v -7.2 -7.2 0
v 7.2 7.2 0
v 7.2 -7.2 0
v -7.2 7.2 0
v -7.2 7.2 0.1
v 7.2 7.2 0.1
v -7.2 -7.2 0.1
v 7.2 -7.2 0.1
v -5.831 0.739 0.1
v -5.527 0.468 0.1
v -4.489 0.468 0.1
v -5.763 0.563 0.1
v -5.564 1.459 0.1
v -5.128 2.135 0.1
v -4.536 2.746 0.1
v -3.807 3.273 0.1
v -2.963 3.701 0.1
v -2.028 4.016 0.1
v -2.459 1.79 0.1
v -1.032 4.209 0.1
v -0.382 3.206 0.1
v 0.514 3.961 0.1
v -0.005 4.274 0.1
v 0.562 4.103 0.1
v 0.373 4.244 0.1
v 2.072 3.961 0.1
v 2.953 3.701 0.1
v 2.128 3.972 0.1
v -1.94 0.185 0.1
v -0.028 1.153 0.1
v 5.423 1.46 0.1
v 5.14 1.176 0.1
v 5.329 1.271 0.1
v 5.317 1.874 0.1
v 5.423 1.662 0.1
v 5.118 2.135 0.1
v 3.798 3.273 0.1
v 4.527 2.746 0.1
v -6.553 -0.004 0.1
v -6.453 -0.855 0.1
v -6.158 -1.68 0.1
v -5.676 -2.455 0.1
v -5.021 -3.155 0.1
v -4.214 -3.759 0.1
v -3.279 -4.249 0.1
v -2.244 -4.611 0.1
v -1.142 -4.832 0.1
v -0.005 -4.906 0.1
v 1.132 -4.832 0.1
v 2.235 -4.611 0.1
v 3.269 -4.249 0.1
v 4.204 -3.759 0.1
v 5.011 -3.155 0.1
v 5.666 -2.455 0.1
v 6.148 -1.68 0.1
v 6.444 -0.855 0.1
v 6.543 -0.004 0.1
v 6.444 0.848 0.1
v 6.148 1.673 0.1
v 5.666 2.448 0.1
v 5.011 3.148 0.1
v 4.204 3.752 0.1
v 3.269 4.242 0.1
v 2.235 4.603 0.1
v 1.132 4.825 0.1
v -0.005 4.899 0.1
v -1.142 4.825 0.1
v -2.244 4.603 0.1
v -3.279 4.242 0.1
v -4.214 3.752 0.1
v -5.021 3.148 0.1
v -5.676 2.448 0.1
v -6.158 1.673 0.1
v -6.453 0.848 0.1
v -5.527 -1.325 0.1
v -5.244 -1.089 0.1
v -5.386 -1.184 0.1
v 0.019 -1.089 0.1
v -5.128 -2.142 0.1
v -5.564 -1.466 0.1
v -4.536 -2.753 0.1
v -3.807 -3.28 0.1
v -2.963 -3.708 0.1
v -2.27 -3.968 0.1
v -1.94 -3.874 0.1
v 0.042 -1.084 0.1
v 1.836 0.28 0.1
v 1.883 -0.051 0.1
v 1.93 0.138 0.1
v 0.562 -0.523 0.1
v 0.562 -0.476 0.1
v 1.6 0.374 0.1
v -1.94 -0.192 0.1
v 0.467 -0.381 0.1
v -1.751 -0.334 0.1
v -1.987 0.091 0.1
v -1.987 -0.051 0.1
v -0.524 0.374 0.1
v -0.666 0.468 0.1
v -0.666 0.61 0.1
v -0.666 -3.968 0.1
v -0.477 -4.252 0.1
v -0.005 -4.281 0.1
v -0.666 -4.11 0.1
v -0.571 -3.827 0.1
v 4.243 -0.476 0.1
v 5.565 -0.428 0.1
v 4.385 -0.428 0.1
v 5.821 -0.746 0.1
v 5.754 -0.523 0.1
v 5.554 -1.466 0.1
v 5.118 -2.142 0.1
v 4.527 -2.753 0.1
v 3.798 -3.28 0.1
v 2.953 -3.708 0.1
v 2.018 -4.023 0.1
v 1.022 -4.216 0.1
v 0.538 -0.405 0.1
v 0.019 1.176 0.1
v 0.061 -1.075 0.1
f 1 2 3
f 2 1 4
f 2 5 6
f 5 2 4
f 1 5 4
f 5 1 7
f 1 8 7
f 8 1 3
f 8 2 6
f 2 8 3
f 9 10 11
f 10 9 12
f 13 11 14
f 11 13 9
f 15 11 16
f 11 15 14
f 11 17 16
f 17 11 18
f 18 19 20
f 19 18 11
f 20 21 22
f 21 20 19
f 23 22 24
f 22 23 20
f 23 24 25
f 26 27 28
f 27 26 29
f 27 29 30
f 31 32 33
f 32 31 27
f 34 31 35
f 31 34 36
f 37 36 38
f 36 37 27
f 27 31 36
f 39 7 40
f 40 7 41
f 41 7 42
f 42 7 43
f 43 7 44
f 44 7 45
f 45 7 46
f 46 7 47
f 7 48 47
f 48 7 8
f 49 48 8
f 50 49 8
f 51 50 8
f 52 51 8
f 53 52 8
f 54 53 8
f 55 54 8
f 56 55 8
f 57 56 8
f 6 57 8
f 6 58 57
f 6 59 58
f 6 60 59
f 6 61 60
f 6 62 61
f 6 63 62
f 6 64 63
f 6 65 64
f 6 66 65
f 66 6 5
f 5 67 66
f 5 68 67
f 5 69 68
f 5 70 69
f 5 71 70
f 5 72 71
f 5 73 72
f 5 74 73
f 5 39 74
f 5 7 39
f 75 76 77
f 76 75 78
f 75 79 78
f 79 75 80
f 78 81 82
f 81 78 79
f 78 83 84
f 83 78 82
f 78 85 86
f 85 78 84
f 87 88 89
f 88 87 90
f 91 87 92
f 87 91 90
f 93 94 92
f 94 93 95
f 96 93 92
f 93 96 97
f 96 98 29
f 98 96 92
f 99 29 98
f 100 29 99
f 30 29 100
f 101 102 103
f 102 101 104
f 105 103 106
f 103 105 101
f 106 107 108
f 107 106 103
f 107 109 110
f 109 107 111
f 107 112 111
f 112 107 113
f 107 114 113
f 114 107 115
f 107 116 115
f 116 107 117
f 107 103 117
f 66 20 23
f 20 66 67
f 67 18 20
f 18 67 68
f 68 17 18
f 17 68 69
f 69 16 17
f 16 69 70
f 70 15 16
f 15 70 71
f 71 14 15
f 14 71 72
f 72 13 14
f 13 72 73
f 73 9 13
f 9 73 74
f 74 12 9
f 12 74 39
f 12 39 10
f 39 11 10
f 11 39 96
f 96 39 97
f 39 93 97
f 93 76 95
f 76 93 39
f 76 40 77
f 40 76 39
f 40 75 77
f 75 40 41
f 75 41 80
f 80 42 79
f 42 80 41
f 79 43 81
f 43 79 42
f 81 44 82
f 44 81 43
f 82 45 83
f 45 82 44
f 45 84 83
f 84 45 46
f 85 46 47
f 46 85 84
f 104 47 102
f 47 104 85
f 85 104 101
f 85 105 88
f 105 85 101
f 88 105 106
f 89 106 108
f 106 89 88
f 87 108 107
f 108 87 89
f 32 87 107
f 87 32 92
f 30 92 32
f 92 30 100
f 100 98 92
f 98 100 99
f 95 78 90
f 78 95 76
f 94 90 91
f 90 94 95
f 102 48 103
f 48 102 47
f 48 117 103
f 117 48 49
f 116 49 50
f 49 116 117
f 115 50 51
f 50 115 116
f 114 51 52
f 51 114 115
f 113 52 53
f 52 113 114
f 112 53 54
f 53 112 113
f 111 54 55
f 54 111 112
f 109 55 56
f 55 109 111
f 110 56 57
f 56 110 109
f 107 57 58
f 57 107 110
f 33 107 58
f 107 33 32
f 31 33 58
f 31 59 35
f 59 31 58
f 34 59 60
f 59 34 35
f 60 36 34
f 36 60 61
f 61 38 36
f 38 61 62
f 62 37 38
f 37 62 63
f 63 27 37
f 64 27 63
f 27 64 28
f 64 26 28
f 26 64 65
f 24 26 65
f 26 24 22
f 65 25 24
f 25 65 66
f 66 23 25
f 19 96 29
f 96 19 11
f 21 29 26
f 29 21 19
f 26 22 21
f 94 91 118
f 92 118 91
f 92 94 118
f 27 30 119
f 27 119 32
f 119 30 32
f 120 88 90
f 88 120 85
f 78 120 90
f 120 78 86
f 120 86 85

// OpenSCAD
// file: ../p/box5-12.scad
use <../lib.scad>
function ldraw_lib__box5_12() = [
// 0 Box with 5 Faces without Any Edges
// 0 Name: box5-12.dat
// 0 Author: Chris Dee [cwdee]
// 0 !LDRAW_ORG Primitive UPDATE 2009-02
// 0 !LICENSE Licensed under CC BY 2.0 and CC BY 4.0 : see CAreadme.txt
// 
// 0 BFC CERTIFY CCW
  [0,"BFC","CERTIFY"],
  [0,"BFC","CCW"],
// 
// 0 !HISTORY 2009-09-03 [PTadmin] Official Update 2009-02
// 
// 
// 4 16 1 1 1 1 1 -1 -1 1 -1 -1 1 1
  [4,16,1,1,1,1,1,-1,-1,1,-1,-1,1,1],
// 4 16 -1 0 1 1 0 1 1 1 1 -1 1 1
  [4,16,-1,0,1,1,0,1,1,1,1,-1,1,1],
// 4 16 -1 0 -1 -1 0 1 -1 1 1 -1 1 -1
  [4,16,-1,0,-1,-1,0,1,-1,1,1,-1,1,-1],
// 4 16 1 0 -1 -1 0 -1 -1 1 -1 1 1 -1
  [4,16,1,0,-1,-1,0,-1,-1,1,-1,1,1,-1],
// 4 16 1 0 1 1 0 -1 1 1 -1 1 1 1
  [4,16,1,0,1,1,0,-1,1,1,-1,1,1,1],
// 0
];
module ldraw_lib__box5_12(step=0, col=false, unit=2/5, alt=false, line=0.2, solid=!$preview)
    makepoly(ldraw_lib__box5_12(), step=step, col=col, unit=unit, alt=alt, line=line, solid=solid);
ldraw_lib__box5_12(line=0.2);
// main file
use <../lib.scad>
use <../p/box5-12.scad>
function ldraw_lib__4125165c() = [
// 0 Sticker  1.8 x  1.8 with Stylised White "LT" in Ellipse on Red Background
// 0 Name: 4125165c.dat
// 0 Author: Max Martin Richter [MMR1988]
// 0 !LDRAW_ORG Part UPDATE 2019-03
// 0 !LICENSE Licensed under CC BY 2.0 and CC BY 4.0 : see CAreadme.txt
// 
// 0 BFC CERTIFY CCW
  [0,"BFC","CERTIFY"],
  [0,"BFC","CCW"],
// 
// 0 !KEYWORDS Set 8448
// 
// 0 !HISTORY 2019-12-27 [PTadmin] Official Update 2019-03
// 
// 
// 1 16 0 -0.25 0 18 0 0 0 0.25 0 0 0 18 box5-12.dat
  [1,16,0,-0.25,0,18,0,0,0,0.25,0,0,0,18, ldraw_lib__box5_12()],
// 
// 4 4 -13.81814 -0.25 1.17104 -11.22214 -0.25 1.17104 -14.57641 -0.25 1.84789 -14.40814 -0.25 1.40704
  [4,4,-13.81814,-0.25,1.17104,-11.22214,-0.25,1.17104,-14.57641,-0.25,1.84789,-14.40814,-0.25,1.40704],
// 4 4 -13.9092 -0.25 3.64832 -14.57641 -0.25 1.84789 -11.22214 -0.25 1.17104 -12.81974 -0.25 5.33762
  [4,4,-13.9092,-0.25,3.64832,-14.57641,-0.25,1.84789,-11.22214,-0.25,1.17104,-12.81974,-0.25,5.33762],
// 4 4 -11.34113 -0.25 6.86448 -12.81974 -0.25 5.33762 -11.22214 -0.25 1.17104 -9.51829 -0.25 8.18248
  [4,4,-11.34113,-0.25,6.86448,-12.81974,-0.25,5.33762,-11.22214,-0.25,1.17104,-9.51829,-0.25,8.18248],
// 4 4 -7.40661 -0.25 9.25159 -9.51829 -0.25 8.18248 -11.22214 -0.25 1.17104 -5.07026 -0.25 10.03933
  [4,4,-7.40661,-0.25,9.25159,-9.51829,-0.25,8.18248,-11.22214,-0.25,1.17104,-5.07026,-0.25,10.03933],
// 4 4 -2.58022 -0.25 10.52175 -5.07026 -0.25 10.03933 -11.22214 -0.25 1.17104 -6.14814 -0.25 4.47504
  [4,4,-2.58022,-0.25,10.52175,-5.07026,-0.25,10.03933,-11.22214,-0.25,1.17104,-6.14814,-0.25,4.47504],
// 4 4 -2.58022 -0.25 10.52175 -6.14814 -0.25 4.47504 -0.95614 -0.25 8.01504 1.28586 -0.25 9.90304
  [4,4,-2.58022,-0.25,10.52175,-6.14814,-0.25,4.47504,-0.95614,-0.25,8.01504,1.28586,-0.25,9.90304],
// 4 4 -2.58022 -0.25 10.52175 1.28586 -0.25 9.90304 1.40386 -0.25 10.25704 -0.01214 -0.25 10.6842
  [4,4,-2.58022,-0.25,10.52175,1.28586,-0.25,9.90304,1.40386,-0.25,10.25704,-0.01214,-0.25,10.6842],
// 3 4 -0.01214 -0.25 10.6842 1.40386 -0.25 10.25704 0.93186 -0.25 10.61104
  [3,4,-0.01214,-0.25,10.6842,1.40386,-0.25,10.25704,0.93186,-0.25,10.61104],
// 4 4 7.38233 -0.25 9.25159 5.32023 -0.25 9.93112 5.17986 -0.25 9.90304 -4.85014 -0.25 0.46304
  [4,4,7.38233,-0.25,9.25159,5.32023,-0.25,9.93112,5.17986,-0.25,9.90304,-4.85014,-0.25,0.46304],
// 3 4 7.38233 -0.25 9.25159 -4.85014 -0.25 0.46304 -0.07114 -0.25 2.88204
  [3,4,7.38233,-0.25,9.25159,-4.85014,-0.25,0.46304,-0.07114,-0.25,2.88204],
// 4 4 7.38233 -0.25 9.25159 12.84986 -0.25 2.94104 13.32186 -0.25 3.17704 13.55786 -0.25 3.64904
  [4,4,7.38233,-0.25,9.25159,12.84986,-0.25,2.94104,13.32186,-0.25,3.17704,13.55786,-0.25,3.64904],
// 4 4 13.55786 -0.25 3.64904 13.55786 -0.25 4.15545 13.29191 -0.25 4.68583 12.79545 -0.25 5.33762
  [4,4,13.55786,-0.25,3.64904,13.55786,-0.25,4.15545,13.29191,-0.25,4.68583,12.79545,-0.25,5.33762],
// 4 4 11.31684 -0.25 6.86448 9.494 -0.25 8.18248 7.38233 -0.25 9.25159 12.79545 -0.25 5.33762
  [4,4,11.31684,-0.25,6.86448,9.494,-0.25,8.18248,7.38233,-0.25,9.25159,12.79545,-0.25,5.33762],
// 3 4 7.38233 -0.25 9.25159 13.55786 -0.25 3.64904 12.79545 -0.25 5.33762
  [3,4,7.38233,-0.25,9.25159,13.55786,-0.25,3.64904,12.79545,-0.25,5.33762],
// 3 4 -16.38228 -0.25 -0.00896 -18 -0.25 -18 -16.13359 -0.25 -2.1373
  [3,4,-16.38228,-0.25,-0.00896,-18,-0.25,-18,-16.13359,-0.25,-2.1373],
// 3 4 -16.13359 -0.25 -2.1373 -18 -0.25 -18 -15.39504 -0.25 -4.20098
  [3,4,-16.13359,-0.25,-2.1373,-18,-0.25,-18,-15.39504,-0.25,-4.20098],
// 3 4 -15.39504 -0.25 -4.20098 -18 -0.25 -18 -14.1891 -0.25 -6.13729
  [3,4,-15.39504,-0.25,-4.20098,-18,-0.25,-18,-14.1891,-0.25,-6.13729],
// 3 4 -14.1891 -0.25 -6.13729 -18 -0.25 -18 -12.5524 -0.25 -7.88738
  [3,4,-14.1891,-0.25,-6.13729,-18,-0.25,-18,-12.5524,-0.25,-7.88738],
// 3 4 -12.5524 -0.25 -7.88738 -18 -0.25 -18 -10.53467 -0.25 -9.3981
  [3,4,-12.5524,-0.25,-7.88738,-18,-0.25,-18,-10.53467,-0.25,-9.3981],
// 3 4 -10.53467 -0.25 -9.3981 -18 -0.25 -18 -8.19721 -0.25 -10.62353
  [3,4,-10.53467,-0.25,-9.3981,-18,-0.25,-18,-8.19721,-0.25,-10.62353],
// 3 4 -8.19721 -0.25 -10.62353 -18 -0.25 -18 -5.61106 -0.25 -11.52645
  [3,4,-8.19721,-0.25,-10.62353,-18,-0.25,-18,-5.61106,-0.25,-11.52645],
// 3 4 -5.61106 -0.25 -11.52645 -18 -0.25 -18 -2.85479 -0.25 -12.07941
  [3,4,-5.61106,-0.25,-11.52645,-18,-0.25,-18,-2.85479,-0.25,-12.07941],
// 4 4 -0.01214 -0.25 -12.26562 -2.85479 -0.25 -12.07941 -18 -0.25 -18 18 -0.25 -18
  [4,4,-0.01214,-0.25,-12.26562,-2.85479,-0.25,-12.07941,-18,-0.25,-18,18,-0.25,-18],
// 3 4 2.8305 -0.25 -12.07941 -0.01214 -0.25 -12.26562 18 -0.25 -18
  [3,4,2.8305,-0.25,-12.07941,-0.01214,-0.25,-12.26562,18,-0.25,-18],
// 3 4 5.58677 -0.25 -11.52645 2.8305 -0.25 -12.07941 18 -0.25 -18
  [3,4,5.58677,-0.25,-11.52645,2.8305,-0.25,-12.07941,18,-0.25,-18],
// 3 4 8.17293 -0.25 -10.62353 5.58677 -0.25 -11.52645 18 -0.25 -18
  [3,4,8.17293,-0.25,-10.62353,5.58677,-0.25,-11.52645,18,-0.25,-18],
// 3 4 10.51038 -0.25 -9.3981 8.17293 -0.25 -10.62353 18 -0.25 -18
  [3,4,10.51038,-0.25,-9.3981,8.17293,-0.25,-10.62353,18,-0.25,-18],
// 3 4 12.52811 -0.25 -7.88738 10.51038 -0.25 -9.3981 18 -0.25 -18
  [3,4,12.52811,-0.25,-7.88738,10.51038,-0.25,-9.3981,18,-0.25,-18],
// 3 4 14.16481 -0.25 -6.13729 12.52811 -0.25 -7.88738 18 -0.25 -18
  [3,4,14.16481,-0.25,-6.13729,12.52811,-0.25,-7.88738,18,-0.25,-18],
// 3 4 15.37076 -0.25 -4.20098 14.16481 -0.25 -6.13729 18 -0.25 -18
  [3,4,15.37076,-0.25,-4.20098,14.16481,-0.25,-6.13729,18,-0.25,-18],
// 3 4 16.1093 -0.25 -2.1373 15.37076 -0.25 -4.20098 18 -0.25 -18
  [3,4,16.1093,-0.25,-2.1373,15.37076,-0.25,-4.20098,18,-0.25,-18],
// 3 4 16.358 -0.25 -0.00896 16.1093 -0.25 -2.1373 18 -0.25 -18
  [3,4,16.358,-0.25,-0.00896,16.1093,-0.25,-2.1373,18,-0.25,-18],
// 3 4 18 -0.25 18 16.358 -0.25 -0.00896 18 -0.25 -18
  [3,4,18,-0.25,18,16.358,-0.25,-0.00896,18,-0.25,-18],
// 3 4 18 -0.25 18 16.1093 -0.25 2.11939 16.358 -0.25 -0.00896
  [3,4,18,-0.25,18,16.1093,-0.25,2.11939,16.358,-0.25,-0.00896],
// 3 4 18 -0.25 18 15.37076 -0.25 4.18307 16.1093 -0.25 2.11939
  [3,4,18,-0.25,18,15.37076,-0.25,4.18307,16.1093,-0.25,2.11939],
// 3 4 18 -0.25 18 14.16481 -0.25 6.11937 15.37076 -0.25 4.18307
  [3,4,18,-0.25,18,14.16481,-0.25,6.11937,15.37076,-0.25,4.18307],
// 3 4 18 -0.25 18 12.52811 -0.25 7.86947 14.16481 -0.25 6.11937
  [3,4,18,-0.25,18,12.52811,-0.25,7.86947,14.16481,-0.25,6.11937],
// 3 4 18 -0.25 18 10.51038 -0.25 9.38019 12.52811 -0.25 7.86947
  [3,4,18,-0.25,18,10.51038,-0.25,9.38019,12.52811,-0.25,7.86947],
// 3 4 18 -0.25 18 8.17293 -0.25 10.60562 10.51038 -0.25 9.38019
  [3,4,18,-0.25,18,8.17293,-0.25,10.60562,10.51038,-0.25,9.38019],
// 3 4 18 -0.25 18 5.58677 -0.25 11.50854 8.17293 -0.25 10.60562
  [3,4,18,-0.25,18,5.58677,-0.25,11.50854,8.17293,-0.25,10.60562],
// 3 4 18 -0.25 18 2.8305 -0.25 12.0615 5.58677 -0.25 11.50854
  [3,4,18,-0.25,18,2.8305,-0.25,12.0615,5.58677,-0.25,11.50854],
// 4 4 -0.01214 -0.25 12.2477 2.8305 -0.25 12.0615 18 -0.25 18 -18 -0.25 18
  [4,4,-0.01214,-0.25,12.2477,2.8305,-0.25,12.0615,18,-0.25,18,-18,-0.25,18],
// 3 4 -18 -0.25 18 -2.85479 -0.25 12.0615 -0.01214 -0.25 12.2477
  [3,4,-18,-0.25,18,-2.85479,-0.25,12.0615,-0.01214,-0.25,12.2477],
// 3 4 -18 -0.25 18 -5.61106 -0.25 11.50854 -2.85479 -0.25 12.0615
  [3,4,-18,-0.25,18,-5.61106,-0.25,11.50854,-2.85479,-0.25,12.0615],
// 3 4 -18 -0.25 18 -8.19721 -0.25 10.60562 -5.61106 -0.25 11.50854
  [3,4,-18,-0.25,18,-8.19721,-0.25,10.60562,-5.61106,-0.25,11.50854],
// 3 4 -18 -0.25 18 -10.53467 -0.25 9.38019 -8.19721 -0.25 10.60562
  [3,4,-18,-0.25,18,-10.53467,-0.25,9.38019,-8.19721,-0.25,10.60562],
// 3 4 -18 -0.25 18 -12.5524 -0.25 7.86947 -10.53467 -0.25 9.38019
  [3,4,-18,-0.25,18,-12.5524,-0.25,7.86947,-10.53467,-0.25,9.38019],
// 3 4 -18 -0.25 18 -14.1891 -0.25 6.11937 -12.5524 -0.25 7.86947
  [3,4,-18,-0.25,18,-14.1891,-0.25,6.11937,-12.5524,-0.25,7.86947],
// 3 4 -18 -0.25 18 -15.39504 -0.25 4.18307 -14.1891 -0.25 6.11937
  [3,4,-18,-0.25,18,-15.39504,-0.25,4.18307,-14.1891,-0.25,6.11937],
// 3 4 -18 -0.25 18 -16.13359 -0.25 2.11939 -15.39504 -0.25 4.18307
  [3,4,-18,-0.25,18,-16.13359,-0.25,2.11939,-15.39504,-0.25,4.18307],
// 3 4 -18 -0.25 18 -16.38228 -0.25 -0.00896 -16.13359 -0.25 2.11939
  [3,4,-18,-0.25,18,-16.38228,-0.25,-0.00896,-16.13359,-0.25,2.11939],
// 3 4 -18 -0.25 18 -18 -0.25 -18 -16.38228 -0.25 -0.00896
  [3,4,-18,-0.25,18,-18,-0.25,-18,-16.38228,-0.25,-0.00896],
// 4 4 0.04686 -0.25 -2.72296 -13.11014 -0.25 -2.72296 -13.46414 -0.25 -2.95896 -13.81814 -0.25 -3.31296
  [4,4,0.04686,-0.25,-2.72296,-13.11014,-0.25,-2.72296,-13.46414,-0.25,-2.95896,-13.81814,-0.25,-3.31296],
// 4 4 0.04686 -0.25 -2.72296 -13.81814 -0.25 -3.31296 -13.9092 -0.25 -3.66623 -12.81974 -0.25 -5.35554
  [4,4,0.04686,-0.25,-2.72296,-13.81814,-0.25,-3.31296,-13.9092,-0.25,-3.66623,-12.81974,-0.25,-5.35554],
// 4 4 0.04686 -0.25 -2.72296 -12.81974 -0.25 -5.35554 -11.34113 -0.25 -6.88239 -9.51829 -0.25 -8.20039
  [4,4,0.04686,-0.25,-2.72296,-12.81974,-0.25,-5.35554,-11.34113,-0.25,-6.88239,-9.51829,-0.25,-8.20039],
// 4 4 0.04686 -0.25 -2.72296 -9.51829 -0.25 -8.20039 -7.40661 -0.25 -9.2695 -5.67614 -0.25 -9.92096
  [4,4,0.04686,-0.25,-2.72296,-9.51829,-0.25,-8.20039,-7.40661,-0.25,-9.2695,-5.67614,-0.25,-9.92096],
// 4 4 0.04686 -0.25 -2.72296 -5.67614 -0.25 -9.92096 -4.85014 -0.25 -9.68496 0.10586 -0.25 -2.71116
  [4,4,0.04686,-0.25,-2.72296,-5.67614,-0.25,-9.92096,-4.85014,-0.25,-9.68496,0.10586,-0.25,-2.71116],
// 4 4 1.40386 -0.25 -1.30696 4.70786 -0.25 -0.12696 4.82586 -0.25 0.34504 4.58986 -0.25 0.69904
  [4,4,1.40386,-0.25,-1.30696,4.70786,-0.25,-0.12696,4.82586,-0.25,0.34504,4.58986,-0.25,0.69904],
// 4 4 1.40386 -0.25 -1.30696 4.58986 -0.25 0.69904 3.99986 -0.25 0.93504 1.40386 -0.25 -1.18896
  [4,4,1.40386,-0.25,-1.30696,4.58986,-0.25,0.69904,3.99986,-0.25,0.93504,1.40386,-0.25,-1.18896],
// 4 4 -4.37814 -0.25 -0.83496 1.16786 -0.25 -0.95296 3.99986 -0.25 0.93504 -4.85014 -0.25 -0.48096
  [4,4,-4.37814,-0.25,-0.83496,1.16786,-0.25,-0.95296,3.99986,-0.25,0.93504,-4.85014,-0.25,-0.48096],
// 4 4 -4.96814 -0.25 -0.12696 -4.85014 -0.25 -0.48096 3.99986 -0.25 0.93504 -4.96814 -0.25 0.22704
  [4,4,-4.96814,-0.25,-0.12696,-4.85014,-0.25,-0.48096,3.99986,-0.25,0.93504,-4.96814,-0.25,0.22704],
// 4 4 -4.85014 -0.25 0.46304 -4.96814 -0.25 0.22704 3.99986 -0.25 0.93504 -1.31014 -0.25 0.93504
  [4,4,-4.85014,-0.25,0.46304,-4.96814,-0.25,0.22704,3.99986,-0.25,0.93504,-1.31014,-0.25,0.93504],
// 3 4 -1.66414 -0.25 1.17104 -4.85014 -0.25 0.46304 -1.31014 -0.25 0.93504
  [3,4,-1.66414,-0.25,1.17104,-4.85014,-0.25,0.46304,-1.31014,-0.25,0.93504],
// 3 4 -1.66414 -0.25 1.52504 -4.85014 -0.25 0.46304 -1.66414 -0.25 1.17104
  [3,4,-1.66414,-0.25,1.52504,-4.85014,-0.25,0.46304,-1.66414,-0.25,1.17104],
// 3 4 -0.07114 -0.25 2.88204 -4.85014 -0.25 0.46304 -1.66414 -0.25 1.52504
  [3,4,-0.07114,-0.25,2.88204,-4.85014,-0.25,0.46304,-1.66414,-0.25,1.52504],
// 4 4 -1.66414 -0.25 -10.27496 -1.19214 -0.25 -10.62896 -0.01214 -0.25 -10.70212 -1.66414 -0.25 -9.92096
  [4,4,-1.66414,-0.25,-10.27496,-1.19214,-0.25,-10.62896,-0.01214,-0.25,-10.70212,-1.66414,-0.25,-9.92096],
// 4 4 -1.42814 -0.25 -9.56696 -1.66414 -0.25 -9.92096 -0.01214 -0.25 -10.70212 10.60786 -0.25 -1.18896
  [4,4,-1.42814,-0.25,-9.56696,-1.66414,-0.25,-9.92096,-0.01214,-0.25,-10.70212,10.60786,-0.25,-1.18896],
// 4 4 10.96186 -0.25 -1.07096 10.60786 -0.25 -1.18896 -0.01214 -0.25 -10.70212 13.91186 -0.25 -1.07096
  [4,4,10.96186,-0.25,-1.07096,10.60786,-0.25,-1.18896,-0.01214,-0.25,-10.70212,13.91186,-0.25,-1.07096],
// 4 4 14.55212 -0.25 -1.8658 14.38386 -0.25 -1.30696 13.91186 -0.25 -1.07096 13.88491 -0.25 -3.66623
  [4,4,14.55212,-0.25,-1.8658,14.38386,-0.25,-1.30696,13.91186,-0.25,-1.07096,13.88491,-0.25,-3.66623],
// 4 4 12.79545 -0.25 -5.35554 13.88491 -0.25 -3.66623 13.91186 -0.25 -1.07096 11.31684 -0.25 -6.88239
  [4,4,12.79545,-0.25,-5.35554,13.88491,-0.25,-3.66623,13.91186,-0.25,-1.07096,11.31684,-0.25,-6.88239],
// 4 4 9.494 -0.25 -8.20039 11.31684 -0.25 -6.88239 13.91186 -0.25 -1.07096 7.38233 -0.25 -9.2695
  [4,4,9.494,-0.25,-8.20039,11.31684,-0.25,-6.88239,13.91186,-0.25,-1.07096,7.38233,-0.25,-9.2695],
// 4 4 5.04597 -0.25 -10.05724 7.38233 -0.25 -9.2695 13.91186 -0.25 -1.07096 2.55593 -0.25 -10.53966
  [4,4,5.04597,-0.25,-10.05724,7.38233,-0.25,-9.2695,13.91186,-0.25,-1.07096,2.55593,-0.25,-10.53966],
// 3 4 13.91186 -0.25 -1.07096 -0.01214 -0.25 -10.70212 2.55593 -0.25 -10.53966
  [3,4,13.91186,-0.25,-1.07096,-0.01214,-0.25,-10.70212,2.55593,-0.25,-10.53966],
// 4 15 -0.01214 -0.25 10.6842 -0.01214 -0.25 12.2477 -2.85479 -0.25 12.0615 -2.58022 -0.25 10.52175
  [4,15,-0.01214,-0.25,10.6842,-0.01214,-0.25,12.2477,-2.85479,-0.25,12.0615,-2.58022,-0.25,10.52175],
// 4 15 -2.58022 -0.25 10.52175 -2.85479 -0.25 12.0615 -5.61106 -0.25 11.50854 -5.07026 -0.25 10.03933
  [4,15,-2.58022,-0.25,10.52175,-2.85479,-0.25,12.0615,-5.61106,-0.25,11.50854,-5.07026,-0.25,10.03933],
// 4 15 -5.07026 -0.25 10.03933 -5.61106 -0.25 11.50854 -8.19721 -0.25 10.60562 -7.40661 -0.25 9.25159
  [4,15,-5.07026,-0.25,10.03933,-5.61106,-0.25,11.50854,-8.19721,-0.25,10.60562,-7.40661,-0.25,9.25159],
// 4 15 -7.40661 -0.25 9.25159 -8.19721 -0.25 10.60562 -10.53467 -0.25 9.38019 -9.51829 -0.25 8.18248
  [4,15,-7.40661,-0.25,9.25159,-8.19721,-0.25,10.60562,-10.53467,-0.25,9.38019,-9.51829,-0.25,8.18248],
// 4 15 -9.51829 -0.25 8.18248 -10.53467 -0.25 9.38019 -12.5524 -0.25 7.86947 -11.34113 -0.25 6.86448
  [4,15,-9.51829,-0.25,8.18248,-10.53467,-0.25,9.38019,-12.5524,-0.25,7.86947,-11.34113,-0.25,6.86448],
// 4 15 -11.34113 -0.25 6.86448 -12.5524 -0.25 7.86947 -14.1891 -0.25 6.11937 -12.81974 -0.25 5.33762
  [4,15,-11.34113,-0.25,6.86448,-12.5524,-0.25,7.86947,-14.1891,-0.25,6.11937,-12.81974,-0.25,5.33762],
// 4 15 -12.81974 -0.25 5.33762 -14.1891 -0.25 6.11937 -15.39504 -0.25 4.18307 -13.9092 -0.25 3.64832
  [4,15,-12.81974,-0.25,5.33762,-14.1891,-0.25,6.11937,-15.39504,-0.25,4.18307,-13.9092,-0.25,3.64832],
// 4 15 -13.9092 -0.25 3.64832 -15.39504 -0.25 4.18307 -16.13359 -0.25 2.11939 -14.57641 -0.25 1.84789
  [4,15,-13.9092,-0.25,3.64832,-15.39504,-0.25,4.18307,-16.13359,-0.25,2.11939,-14.57641,-0.25,1.84789],
// 4 15 -14.40814 -0.25 1.40704 -14.57641 -0.25 1.84789 -16.13359 -0.25 2.11939 -16.38228 -0.25 -0.00896
  [4,15,-14.40814,-0.25,1.40704,-14.57641,-0.25,1.84789,-16.13359,-0.25,2.11939,-16.38228,-0.25,-0.00896],
// 3 15 -14.40814 -0.25 1.40704 -16.38228 -0.25 -0.00896 -13.81814 -0.25 1.17104
  [3,15,-14.40814,-0.25,1.40704,-16.38228,-0.25,-0.00896,-13.81814,-0.25,1.17104],
// 4 15 -11.22214 -0.25 1.17104 -13.81814 -0.25 1.17104 -16.38228 -0.25 -0.00896 -4.96814 -0.25 0.22704
  [4,15,-11.22214,-0.25,1.17104,-13.81814,-0.25,1.17104,-16.38228,-0.25,-0.00896,-4.96814,-0.25,0.22704],
// 3 15 -4.96814 -0.25 0.22704 -16.38228 -0.25 -0.00896 -4.96814 -0.25 -0.12696
  [3,15,-4.96814,-0.25,0.22704,-16.38228,-0.25,-0.00896,-4.96814,-0.25,-0.12696],
// 3 15 -16.38228 -0.25 -0.00896 -4.85014 -0.25 -0.48096 -4.96814 -0.25 -0.12696
  [3,15,-16.38228,-0.25,-0.00896,-4.85014,-0.25,-0.48096,-4.96814,-0.25,-0.12696],
// 4 15 -4.37814 -0.25 -0.83496 -4.85014 -0.25 -0.48096 -16.38228 -0.25 -0.00896 -13.11014 -0.25 -2.72296
  [4,15,-4.37814,-0.25,-0.83496,-4.85014,-0.25,-0.48096,-16.38228,-0.25,-0.00896,-13.11014,-0.25,-2.72296],
// 4 15 -13.11014 -0.25 -2.72296 -16.38228 -0.25 -0.00896 -16.13359 -0.25 -2.1373 -13.46414 -0.25 -2.95896
  [4,15,-13.11014,-0.25,-2.72296,-16.38228,-0.25,-0.00896,-16.13359,-0.25,-2.1373,-13.46414,-0.25,-2.95896],
// 4 15 -13.81814 -0.25 -3.31296 -13.46414 -0.25 -2.95896 -16.13359 -0.25 -2.1373 -15.39504 -0.25 -4.20098
  [4,15,-13.81814,-0.25,-3.31296,-13.46414,-0.25,-2.95896,-16.13359,-0.25,-2.1373,-15.39504,-0.25,-4.20098],
// 3 15 -13.81814 -0.25 -3.31296 -15.39504 -0.25 -4.20098 -13.9092 -0.25 -3.66623
  [3,15,-13.81814,-0.25,-3.31296,-15.39504,-0.25,-4.20098,-13.9092,-0.25,-3.66623],
// 4 15 -13.9092 -0.25 -3.66623 -15.39504 -0.25 -4.20098 -14.1891 -0.25 -6.13729 -12.81974 -0.25 -5.35554
  [4,15,-13.9092,-0.25,-3.66623,-15.39504,-0.25,-4.20098,-14.1891,-0.25,-6.13729,-12.81974,-0.25,-5.35554],
// 4 15 -12.81974 -0.25 -5.35554 -14.1891 -0.25 -6.13729 -12.5524 -0.25 -7.88738 -11.34113 -0.25 -6.88239
  [4,15,-12.81974,-0.25,-5.35554,-14.1891,-0.25,-6.13729,-12.5524,-0.25,-7.88738,-11.34113,-0.25,-6.88239],
// 4 15 -11.34113 -0.25 -6.88239 -12.5524 -0.25 -7.88738 -10.53467 -0.25 -9.3981 -9.51829 -0.25 -8.20039
  [4,15,-11.34113,-0.25,-6.88239,-12.5524,-0.25,-7.88738,-10.53467,-0.25,-9.3981,-9.51829,-0.25,-8.20039],
// 4 15 -9.51829 -0.25 -8.20039 -10.53467 -0.25 -9.3981 -8.19721 -0.25 -10.62353 -7.40661 -0.25 -9.2695
  [4,15,-9.51829,-0.25,-8.20039,-10.53467,-0.25,-9.3981,-8.19721,-0.25,-10.62353,-7.40661,-0.25,-9.2695],
// 4 15 -7.40661 -0.25 -9.2695 -8.19721 -0.25 -10.62353 -5.61106 -0.25 -11.52645 -5.67614 -0.25 -9.92096
  [4,15,-7.40661,-0.25,-9.2695,-8.19721,-0.25,-10.62353,-5.61106,-0.25,-11.52645,-5.67614,-0.25,-9.92096],
// 4 15 -5.67614 -0.25 -9.92096 -5.61106 -0.25 -11.52645 -2.85479 -0.25 -12.07941 -4.85014 -0.25 -9.68496
  [4,15,-5.67614,-0.25,-9.92096,-5.61106,-0.25,-11.52645,-2.85479,-0.25,-12.07941,-4.85014,-0.25,-9.68496],
// 4 15 -4.85014 -0.25 -9.68496 -2.85479 -0.25 -12.07941 -1.19214 -0.25 -10.62896 -1.66414 -0.25 -10.27496
  [4,15,-4.85014,-0.25,-9.68496,-2.85479,-0.25,-12.07941,-1.19214,-0.25,-10.62896,-1.66414,-0.25,-10.27496],
// 3 15 -4.85014 -0.25 -9.68496 -1.66414 -0.25 -10.27496 -1.66414 -0.25 -9.92096
  [3,15,-4.85014,-0.25,-9.68496,-1.66414,-0.25,-10.27496,-1.66414,-0.25,-9.92096],
// 4 15 -4.85014 -0.25 -9.68496 -1.66414 -0.25 -9.92096 -1.42814 -0.25 -9.56696 4.70786 -0.25 -0.12696
  [4,15,-4.85014,-0.25,-9.68496,-1.66414,-0.25,-9.92096,-1.42814,-0.25,-9.56696,4.70786,-0.25,-0.12696],
// 3 15 4.70786 -0.25 -0.12696 -1.42814 -0.25 -9.56696 10.60786 -0.25 -1.18896
  [3,15,4.70786,-0.25,-0.12696,-1.42814,-0.25,-9.56696,10.60786,-0.25,-1.18896],
// 4 15 4.82586 -0.25 0.34504 4.70786 -0.25 -0.12696 10.60786 -0.25 -1.18896 10.96186 -0.25 -1.07096
  [4,15,4.82586,-0.25,0.34504,4.70786,-0.25,-0.12696,10.60786,-0.25,-1.18896,10.96186,-0.25,-1.07096],
// 4 15 4.58986 -0.25 0.69904 4.82586 -0.25 0.34504 10.96186 -0.25 -1.07096 13.91186 -0.25 -1.07096
  [4,15,4.58986,-0.25,0.69904,4.82586,-0.25,0.34504,10.96186,-0.25,-1.07096,13.91186,-0.25,-1.07096],
// 4 15 4.58986 -0.25 0.69904 13.91186 -0.25 -1.07096 12.84986 -0.25 2.94104 3.99986 -0.25 0.93504
  [4,15,4.58986,-0.25,0.69904,13.91186,-0.25,-1.07096,12.84986,-0.25,2.94104,3.99986,-0.25,0.93504],
// 4 15 3.99986 -0.25 0.93504 12.84986 -0.25 2.94104 -0.07114 -0.25 2.88204 -1.66414 -0.25 1.52504
  [4,15,3.99986,-0.25,0.93504,12.84986,-0.25,2.94104,-0.07114,-0.25,2.88204,-1.66414,-0.25,1.52504],
// 4 15 3.99986 -0.25 0.93504 -1.66414 -0.25 1.52504 -1.66414 -0.25 1.17104 -1.31014 -0.25 0.93504
  [4,15,3.99986,-0.25,0.93504,-1.66414,-0.25,1.52504,-1.66414,-0.25,1.17104,-1.31014,-0.25,0.93504],
// 4 15 -4.37814 -0.25 -0.83496 -13.11014 -0.25 -2.72296 0.04686 -0.25 -2.72296 1.40386 -0.25 -1.30696
  [4,15,-4.37814,-0.25,-0.83496,-13.11014,-0.25,-2.72296,0.04686,-0.25,-2.72296,1.40386,-0.25,-1.30696],
// 4 15 -4.37814 -0.25 -0.83496 1.40386 -0.25 -1.30696 1.40386 -0.25 -1.18896 1.16786 -0.25 -0.95296
  [4,15,-4.37814,-0.25,-0.83496,1.40386,-0.25,-1.30696,1.40386,-0.25,-1.18896,1.16786,-0.25,-0.95296],
// 4 15 -1.19214 -0.25 -10.62896 -2.85479 -0.25 -12.07941 -0.01214 -0.25 -12.26562 -0.01214 -0.25 -10.70212
  [4,15,-1.19214,-0.25,-10.62896,-2.85479,-0.25,-12.07941,-0.01214,-0.25,-12.26562,-0.01214,-0.25,-10.70212],
// 4 15 -0.01214 -0.25 -10.70212 -0.01214 -0.25 -12.26562 2.8305 -0.25 -12.07941 2.55593 -0.25 -10.53966
  [4,15,-0.01214,-0.25,-10.70212,-0.01214,-0.25,-12.26562,2.8305,-0.25,-12.07941,2.55593,-0.25,-10.53966],
// 4 15 2.55593 -0.25 -10.53966 2.8305 -0.25 -12.07941 5.58677 -0.25 -11.52645 5.04597 -0.25 -10.05724
  [4,15,2.55593,-0.25,-10.53966,2.8305,-0.25,-12.07941,5.58677,-0.25,-11.52645,5.04597,-0.25,-10.05724],
// 4 15 5.04597 -0.25 -10.05724 5.58677 -0.25 -11.52645 8.17293 -0.25 -10.62353 7.38233 -0.25 -9.2695
  [4,15,5.04597,-0.25,-10.05724,5.58677,-0.25,-11.52645,8.17293,-0.25,-10.62353,7.38233,-0.25,-9.2695],
// 4 15 7.38233 -0.25 -9.2695 8.17293 -0.25 -10.62353 10.51038 -0.25 -9.3981 9.494 -0.25 -8.20039
  [4,15,7.38233,-0.25,-9.2695,8.17293,-0.25,-10.62353,10.51038,-0.25,-9.3981,9.494,-0.25,-8.20039],
// 4 15 9.494 -0.25 -8.20039 10.51038 -0.25 -9.3981 12.52811 -0.25 -7.88738 11.31684 -0.25 -6.88239
  [4,15,9.494,-0.25,-8.20039,10.51038,-0.25,-9.3981,12.52811,-0.25,-7.88738,11.31684,-0.25,-6.88239],
// 4 15 11.31684 -0.25 -6.88239 12.52811 -0.25 -7.88738 14.16481 -0.25 -6.13729 12.79545 -0.25 -5.35554
  [4,15,11.31684,-0.25,-6.88239,12.52811,-0.25,-7.88738,14.16481,-0.25,-6.13729,12.79545,-0.25,-5.35554],
// 4 15 12.79545 -0.25 -5.35554 14.16481 -0.25 -6.13729 15.37076 -0.25 -4.20098 13.88491 -0.25 -3.66623
  [4,15,12.79545,-0.25,-5.35554,14.16481,-0.25,-6.13729,15.37076,-0.25,-4.20098,13.88491,-0.25,-3.66623],
// 4 15 13.88491 -0.25 -3.66623 15.37076 -0.25 -4.20098 16.1093 -0.25 -2.1373 14.55212 -0.25 -1.8658
  [4,15,13.88491,-0.25,-3.66623,15.37076,-0.25,-4.20098,16.1093,-0.25,-2.1373,14.55212,-0.25,-1.8658],
// 4 15 14.55212 -0.25 -1.8658 16.1093 -0.25 -2.1373 16.358 -0.25 -0.00896 14.38386 -0.25 -1.30696
  [4,15,14.55212,-0.25,-1.8658,16.1093,-0.25,-2.1373,16.358,-0.25,-0.00896,14.38386,-0.25,-1.30696],
// 4 15 13.91186 -0.25 -1.07096 14.38386 -0.25 -1.30696 16.358 -0.25 -0.00896 16.1093 -0.25 2.11939
  [4,15,13.91186,-0.25,-1.07096,14.38386,-0.25,-1.30696,16.358,-0.25,-0.00896,16.1093,-0.25,2.11939],
// 4 15 12.84986 -0.25 2.94104 13.91186 -0.25 -1.07096 16.1093 -0.25 2.11939 13.32186 -0.25 3.17704
  [4,15,12.84986,-0.25,2.94104,13.91186,-0.25,-1.07096,16.1093,-0.25,2.11939,13.32186,-0.25,3.17704],
// 3 15 13.55786 -0.25 3.64904 13.32186 -0.25 3.17704 16.1093 -0.25 2.11939
  [3,15,13.55786,-0.25,3.64904,13.32186,-0.25,3.17704,16.1093,-0.25,2.11939],
// 4 15 13.55786 -0.25 4.15545 13.55786 -0.25 3.64904 16.1093 -0.25 2.11939 15.37076 -0.25 4.18307
  [4,15,13.55786,-0.25,4.15545,13.55786,-0.25,3.64904,16.1093,-0.25,2.11939,15.37076,-0.25,4.18307],
// 4 15 13.29191 -0.25 4.68583 13.55786 -0.25 4.15545 15.37076 -0.25 4.18307 14.16481 -0.25 6.11937
  [4,15,13.29191,-0.25,4.68583,13.55786,-0.25,4.15545,15.37076,-0.25,4.18307,14.16481,-0.25,6.11937],
// 4 15 12.79545 -0.25 5.33762 13.29191 -0.25 4.68583 14.16481 -0.25 6.11937 12.52811 -0.25 7.86947
  [4,15,12.79545,-0.25,5.33762,13.29191,-0.25,4.68583,14.16481,-0.25,6.11937,12.52811,-0.25,7.86947],
// 4 15 11.31684 -0.25 6.86448 12.79545 -0.25 5.33762 12.52811 -0.25 7.86947 10.51038 -0.25 9.38019
  [4,15,11.31684,-0.25,6.86448,12.79545,-0.25,5.33762,12.52811,-0.25,7.86947,10.51038,-0.25,9.38019],
// 4 15 9.494 -0.25 8.18248 11.31684 -0.25 6.86448 10.51038 -0.25 9.38019 8.17293 -0.25 10.60562
  [4,15,9.494,-0.25,8.18248,11.31684,-0.25,6.86448,10.51038,-0.25,9.38019,8.17293,-0.25,10.60562],
// 3 15 8.17293 -0.25 10.60562 7.38233 -0.25 9.25159 9.494 -0.25 8.18248
  [3,15,8.17293,-0.25,10.60562,7.38233,-0.25,9.25159,9.494,-0.25,8.18248],
// 4 15 5.32023 -0.25 9.93112 7.38233 -0.25 9.25159 8.17293 -0.25 10.60562 5.58677 -0.25 11.50854
  [4,15,5.32023,-0.25,9.93112,7.38233,-0.25,9.25159,8.17293,-0.25,10.60562,5.58677,-0.25,11.50854],
// 4 15 5.32023 -0.25 9.93112 5.58677 -0.25 11.50854 2.8305 -0.25 12.0615 5.17986 -0.25 9.90304
  [4,15,5.32023,-0.25,9.93112,5.58677,-0.25,11.50854,2.8305,-0.25,12.0615,5.17986,-0.25,9.90304],
// 4 15 1.28586 -0.25 9.90304 5.17986 -0.25 9.90304 2.8305 -0.25 12.0615 1.40386 -0.25 10.25704
  [4,15,1.28586,-0.25,9.90304,5.17986,-0.25,9.90304,2.8305,-0.25,12.0615,1.40386,-0.25,10.25704],
// 4 15 0.93186 -0.25 10.61104 1.40386 -0.25 10.25704 2.8305 -0.25 12.0615 -0.01214 -0.25 12.2477
  [4,15,0.93186,-0.25,10.61104,1.40386,-0.25,10.25704,2.8305,-0.25,12.0615,-0.01214,-0.25,12.2477],
// 3 15 -0.01214 -0.25 12.2477 -0.01214 -0.25 10.6842 0.93186 -0.25 10.61104
  [3,15,-0.01214,-0.25,12.2477,-0.01214,-0.25,10.6842,0.93186,-0.25,10.61104],
// 4 15 -11.22214 -0.25 1.17104 -4.96814 -0.25 0.22704 -4.85014 -0.25 0.46304 -6.14814 -0.25 4.47504
  [4,15,-11.22214,-0.25,1.17104,-4.96814,-0.25,0.22704,-4.85014,-0.25,0.46304,-6.14814,-0.25,4.47504],
// 4 15 -0.95614 -0.25 8.01504 -6.14814 -0.25 4.47504 -4.85014 -0.25 0.46304 5.17986 -0.25 9.90304
  [4,15,-0.95614,-0.25,8.01504,-6.14814,-0.25,4.47504,-4.85014,-0.25,0.46304,5.17986,-0.25,9.90304],
// 3 15 5.17986 -0.25 9.90304 1.28586 -0.25 9.90304 -0.95614 -0.25 8.01504
  [3,15,5.17986,-0.25,9.90304,1.28586,-0.25,9.90304,-0.95614,-0.25,8.01504],
// 3 15 1.16786 -0.25 -0.95296 1.40386 -0.25 -1.18896 1.34486 -0.25 -1.01196
  [3,15,1.16786,-0.25,-0.95296,1.40386,-0.25,-1.18896,1.34486,-0.25,-1.01196],
// 3 4 3.99986 -0.25 0.93504 1.34486 -0.25 -1.01196 1.40386 -0.25 -1.18896
  [3,4,3.99986,-0.25,0.93504,1.34486,-0.25,-1.01196,1.40386,-0.25,-1.18896],
// 3 4 3.99986 -0.25 0.93504 1.16786 -0.25 -0.95296 1.34486 -0.25 -1.01196
  [3,4,3.99986,-0.25,0.93504,1.16786,-0.25,-0.95296,1.34486,-0.25,-1.01196],
// 3 4 7.38233 -0.25 9.25159 -0.07114 -0.25 2.88204 0.04686 -0.25 2.94104
  [3,4,7.38233,-0.25,9.25159,-0.07114,-0.25,2.88204,0.04686,-0.25,2.94104],
// 3 4 7.38233 -0.25 9.25159 0.04686 -0.25 2.94104 12.84986 -0.25 2.94104
  [3,4,7.38233,-0.25,9.25159,0.04686,-0.25,2.94104,12.84986,-0.25,2.94104],
// 3 15 0.04686 -0.25 2.94104 -0.07114 -0.25 2.88204 12.84986 -0.25 2.94104
  [3,15,0.04686,-0.25,2.94104,-0.07114,-0.25,2.88204,12.84986,-0.25,2.94104],
// 4 4 -4.85014 -0.25 -9.68496 4.70786 -0.25 -0.12696 1.40386 -0.25 -1.30696 0.15306 -0.25 -2.68756
  [4,4,-4.85014,-0.25,-9.68496,4.70786,-0.25,-0.12696,1.40386,-0.25,-1.30696,0.15306,-0.25,-2.68756],
// 4 15 0.04686 -0.25 -2.72296 0.10586 -0.25 -2.71116 0.15306 -0.25 -2.68756 1.40386 -0.25 -1.30696
  [4,15,0.04686,-0.25,-2.72296,0.10586,-0.25,-2.71116,0.15306,-0.25,-2.68756,1.40386,-0.25,-1.30696],
// 3 4 0.15306 -0.25 -2.68756 0.10586 -0.25 -2.71116 -4.85014 -0.25 -9.68496
  [3,4,0.15306,-0.25,-2.68756,0.10586,-0.25,-2.71116,-4.85014,-0.25,-9.68496],
];
module ldraw_lib__4125165c(step=0, col=false, unit=2/5, alt=false, line=0.2, solid=!$preview)
    makepoly(ldraw_lib__4125165c(), step=step, col=col, unit=unit, alt=alt, line=line, solid=solid);
ldraw_lib__4125165c(line=0.2);
